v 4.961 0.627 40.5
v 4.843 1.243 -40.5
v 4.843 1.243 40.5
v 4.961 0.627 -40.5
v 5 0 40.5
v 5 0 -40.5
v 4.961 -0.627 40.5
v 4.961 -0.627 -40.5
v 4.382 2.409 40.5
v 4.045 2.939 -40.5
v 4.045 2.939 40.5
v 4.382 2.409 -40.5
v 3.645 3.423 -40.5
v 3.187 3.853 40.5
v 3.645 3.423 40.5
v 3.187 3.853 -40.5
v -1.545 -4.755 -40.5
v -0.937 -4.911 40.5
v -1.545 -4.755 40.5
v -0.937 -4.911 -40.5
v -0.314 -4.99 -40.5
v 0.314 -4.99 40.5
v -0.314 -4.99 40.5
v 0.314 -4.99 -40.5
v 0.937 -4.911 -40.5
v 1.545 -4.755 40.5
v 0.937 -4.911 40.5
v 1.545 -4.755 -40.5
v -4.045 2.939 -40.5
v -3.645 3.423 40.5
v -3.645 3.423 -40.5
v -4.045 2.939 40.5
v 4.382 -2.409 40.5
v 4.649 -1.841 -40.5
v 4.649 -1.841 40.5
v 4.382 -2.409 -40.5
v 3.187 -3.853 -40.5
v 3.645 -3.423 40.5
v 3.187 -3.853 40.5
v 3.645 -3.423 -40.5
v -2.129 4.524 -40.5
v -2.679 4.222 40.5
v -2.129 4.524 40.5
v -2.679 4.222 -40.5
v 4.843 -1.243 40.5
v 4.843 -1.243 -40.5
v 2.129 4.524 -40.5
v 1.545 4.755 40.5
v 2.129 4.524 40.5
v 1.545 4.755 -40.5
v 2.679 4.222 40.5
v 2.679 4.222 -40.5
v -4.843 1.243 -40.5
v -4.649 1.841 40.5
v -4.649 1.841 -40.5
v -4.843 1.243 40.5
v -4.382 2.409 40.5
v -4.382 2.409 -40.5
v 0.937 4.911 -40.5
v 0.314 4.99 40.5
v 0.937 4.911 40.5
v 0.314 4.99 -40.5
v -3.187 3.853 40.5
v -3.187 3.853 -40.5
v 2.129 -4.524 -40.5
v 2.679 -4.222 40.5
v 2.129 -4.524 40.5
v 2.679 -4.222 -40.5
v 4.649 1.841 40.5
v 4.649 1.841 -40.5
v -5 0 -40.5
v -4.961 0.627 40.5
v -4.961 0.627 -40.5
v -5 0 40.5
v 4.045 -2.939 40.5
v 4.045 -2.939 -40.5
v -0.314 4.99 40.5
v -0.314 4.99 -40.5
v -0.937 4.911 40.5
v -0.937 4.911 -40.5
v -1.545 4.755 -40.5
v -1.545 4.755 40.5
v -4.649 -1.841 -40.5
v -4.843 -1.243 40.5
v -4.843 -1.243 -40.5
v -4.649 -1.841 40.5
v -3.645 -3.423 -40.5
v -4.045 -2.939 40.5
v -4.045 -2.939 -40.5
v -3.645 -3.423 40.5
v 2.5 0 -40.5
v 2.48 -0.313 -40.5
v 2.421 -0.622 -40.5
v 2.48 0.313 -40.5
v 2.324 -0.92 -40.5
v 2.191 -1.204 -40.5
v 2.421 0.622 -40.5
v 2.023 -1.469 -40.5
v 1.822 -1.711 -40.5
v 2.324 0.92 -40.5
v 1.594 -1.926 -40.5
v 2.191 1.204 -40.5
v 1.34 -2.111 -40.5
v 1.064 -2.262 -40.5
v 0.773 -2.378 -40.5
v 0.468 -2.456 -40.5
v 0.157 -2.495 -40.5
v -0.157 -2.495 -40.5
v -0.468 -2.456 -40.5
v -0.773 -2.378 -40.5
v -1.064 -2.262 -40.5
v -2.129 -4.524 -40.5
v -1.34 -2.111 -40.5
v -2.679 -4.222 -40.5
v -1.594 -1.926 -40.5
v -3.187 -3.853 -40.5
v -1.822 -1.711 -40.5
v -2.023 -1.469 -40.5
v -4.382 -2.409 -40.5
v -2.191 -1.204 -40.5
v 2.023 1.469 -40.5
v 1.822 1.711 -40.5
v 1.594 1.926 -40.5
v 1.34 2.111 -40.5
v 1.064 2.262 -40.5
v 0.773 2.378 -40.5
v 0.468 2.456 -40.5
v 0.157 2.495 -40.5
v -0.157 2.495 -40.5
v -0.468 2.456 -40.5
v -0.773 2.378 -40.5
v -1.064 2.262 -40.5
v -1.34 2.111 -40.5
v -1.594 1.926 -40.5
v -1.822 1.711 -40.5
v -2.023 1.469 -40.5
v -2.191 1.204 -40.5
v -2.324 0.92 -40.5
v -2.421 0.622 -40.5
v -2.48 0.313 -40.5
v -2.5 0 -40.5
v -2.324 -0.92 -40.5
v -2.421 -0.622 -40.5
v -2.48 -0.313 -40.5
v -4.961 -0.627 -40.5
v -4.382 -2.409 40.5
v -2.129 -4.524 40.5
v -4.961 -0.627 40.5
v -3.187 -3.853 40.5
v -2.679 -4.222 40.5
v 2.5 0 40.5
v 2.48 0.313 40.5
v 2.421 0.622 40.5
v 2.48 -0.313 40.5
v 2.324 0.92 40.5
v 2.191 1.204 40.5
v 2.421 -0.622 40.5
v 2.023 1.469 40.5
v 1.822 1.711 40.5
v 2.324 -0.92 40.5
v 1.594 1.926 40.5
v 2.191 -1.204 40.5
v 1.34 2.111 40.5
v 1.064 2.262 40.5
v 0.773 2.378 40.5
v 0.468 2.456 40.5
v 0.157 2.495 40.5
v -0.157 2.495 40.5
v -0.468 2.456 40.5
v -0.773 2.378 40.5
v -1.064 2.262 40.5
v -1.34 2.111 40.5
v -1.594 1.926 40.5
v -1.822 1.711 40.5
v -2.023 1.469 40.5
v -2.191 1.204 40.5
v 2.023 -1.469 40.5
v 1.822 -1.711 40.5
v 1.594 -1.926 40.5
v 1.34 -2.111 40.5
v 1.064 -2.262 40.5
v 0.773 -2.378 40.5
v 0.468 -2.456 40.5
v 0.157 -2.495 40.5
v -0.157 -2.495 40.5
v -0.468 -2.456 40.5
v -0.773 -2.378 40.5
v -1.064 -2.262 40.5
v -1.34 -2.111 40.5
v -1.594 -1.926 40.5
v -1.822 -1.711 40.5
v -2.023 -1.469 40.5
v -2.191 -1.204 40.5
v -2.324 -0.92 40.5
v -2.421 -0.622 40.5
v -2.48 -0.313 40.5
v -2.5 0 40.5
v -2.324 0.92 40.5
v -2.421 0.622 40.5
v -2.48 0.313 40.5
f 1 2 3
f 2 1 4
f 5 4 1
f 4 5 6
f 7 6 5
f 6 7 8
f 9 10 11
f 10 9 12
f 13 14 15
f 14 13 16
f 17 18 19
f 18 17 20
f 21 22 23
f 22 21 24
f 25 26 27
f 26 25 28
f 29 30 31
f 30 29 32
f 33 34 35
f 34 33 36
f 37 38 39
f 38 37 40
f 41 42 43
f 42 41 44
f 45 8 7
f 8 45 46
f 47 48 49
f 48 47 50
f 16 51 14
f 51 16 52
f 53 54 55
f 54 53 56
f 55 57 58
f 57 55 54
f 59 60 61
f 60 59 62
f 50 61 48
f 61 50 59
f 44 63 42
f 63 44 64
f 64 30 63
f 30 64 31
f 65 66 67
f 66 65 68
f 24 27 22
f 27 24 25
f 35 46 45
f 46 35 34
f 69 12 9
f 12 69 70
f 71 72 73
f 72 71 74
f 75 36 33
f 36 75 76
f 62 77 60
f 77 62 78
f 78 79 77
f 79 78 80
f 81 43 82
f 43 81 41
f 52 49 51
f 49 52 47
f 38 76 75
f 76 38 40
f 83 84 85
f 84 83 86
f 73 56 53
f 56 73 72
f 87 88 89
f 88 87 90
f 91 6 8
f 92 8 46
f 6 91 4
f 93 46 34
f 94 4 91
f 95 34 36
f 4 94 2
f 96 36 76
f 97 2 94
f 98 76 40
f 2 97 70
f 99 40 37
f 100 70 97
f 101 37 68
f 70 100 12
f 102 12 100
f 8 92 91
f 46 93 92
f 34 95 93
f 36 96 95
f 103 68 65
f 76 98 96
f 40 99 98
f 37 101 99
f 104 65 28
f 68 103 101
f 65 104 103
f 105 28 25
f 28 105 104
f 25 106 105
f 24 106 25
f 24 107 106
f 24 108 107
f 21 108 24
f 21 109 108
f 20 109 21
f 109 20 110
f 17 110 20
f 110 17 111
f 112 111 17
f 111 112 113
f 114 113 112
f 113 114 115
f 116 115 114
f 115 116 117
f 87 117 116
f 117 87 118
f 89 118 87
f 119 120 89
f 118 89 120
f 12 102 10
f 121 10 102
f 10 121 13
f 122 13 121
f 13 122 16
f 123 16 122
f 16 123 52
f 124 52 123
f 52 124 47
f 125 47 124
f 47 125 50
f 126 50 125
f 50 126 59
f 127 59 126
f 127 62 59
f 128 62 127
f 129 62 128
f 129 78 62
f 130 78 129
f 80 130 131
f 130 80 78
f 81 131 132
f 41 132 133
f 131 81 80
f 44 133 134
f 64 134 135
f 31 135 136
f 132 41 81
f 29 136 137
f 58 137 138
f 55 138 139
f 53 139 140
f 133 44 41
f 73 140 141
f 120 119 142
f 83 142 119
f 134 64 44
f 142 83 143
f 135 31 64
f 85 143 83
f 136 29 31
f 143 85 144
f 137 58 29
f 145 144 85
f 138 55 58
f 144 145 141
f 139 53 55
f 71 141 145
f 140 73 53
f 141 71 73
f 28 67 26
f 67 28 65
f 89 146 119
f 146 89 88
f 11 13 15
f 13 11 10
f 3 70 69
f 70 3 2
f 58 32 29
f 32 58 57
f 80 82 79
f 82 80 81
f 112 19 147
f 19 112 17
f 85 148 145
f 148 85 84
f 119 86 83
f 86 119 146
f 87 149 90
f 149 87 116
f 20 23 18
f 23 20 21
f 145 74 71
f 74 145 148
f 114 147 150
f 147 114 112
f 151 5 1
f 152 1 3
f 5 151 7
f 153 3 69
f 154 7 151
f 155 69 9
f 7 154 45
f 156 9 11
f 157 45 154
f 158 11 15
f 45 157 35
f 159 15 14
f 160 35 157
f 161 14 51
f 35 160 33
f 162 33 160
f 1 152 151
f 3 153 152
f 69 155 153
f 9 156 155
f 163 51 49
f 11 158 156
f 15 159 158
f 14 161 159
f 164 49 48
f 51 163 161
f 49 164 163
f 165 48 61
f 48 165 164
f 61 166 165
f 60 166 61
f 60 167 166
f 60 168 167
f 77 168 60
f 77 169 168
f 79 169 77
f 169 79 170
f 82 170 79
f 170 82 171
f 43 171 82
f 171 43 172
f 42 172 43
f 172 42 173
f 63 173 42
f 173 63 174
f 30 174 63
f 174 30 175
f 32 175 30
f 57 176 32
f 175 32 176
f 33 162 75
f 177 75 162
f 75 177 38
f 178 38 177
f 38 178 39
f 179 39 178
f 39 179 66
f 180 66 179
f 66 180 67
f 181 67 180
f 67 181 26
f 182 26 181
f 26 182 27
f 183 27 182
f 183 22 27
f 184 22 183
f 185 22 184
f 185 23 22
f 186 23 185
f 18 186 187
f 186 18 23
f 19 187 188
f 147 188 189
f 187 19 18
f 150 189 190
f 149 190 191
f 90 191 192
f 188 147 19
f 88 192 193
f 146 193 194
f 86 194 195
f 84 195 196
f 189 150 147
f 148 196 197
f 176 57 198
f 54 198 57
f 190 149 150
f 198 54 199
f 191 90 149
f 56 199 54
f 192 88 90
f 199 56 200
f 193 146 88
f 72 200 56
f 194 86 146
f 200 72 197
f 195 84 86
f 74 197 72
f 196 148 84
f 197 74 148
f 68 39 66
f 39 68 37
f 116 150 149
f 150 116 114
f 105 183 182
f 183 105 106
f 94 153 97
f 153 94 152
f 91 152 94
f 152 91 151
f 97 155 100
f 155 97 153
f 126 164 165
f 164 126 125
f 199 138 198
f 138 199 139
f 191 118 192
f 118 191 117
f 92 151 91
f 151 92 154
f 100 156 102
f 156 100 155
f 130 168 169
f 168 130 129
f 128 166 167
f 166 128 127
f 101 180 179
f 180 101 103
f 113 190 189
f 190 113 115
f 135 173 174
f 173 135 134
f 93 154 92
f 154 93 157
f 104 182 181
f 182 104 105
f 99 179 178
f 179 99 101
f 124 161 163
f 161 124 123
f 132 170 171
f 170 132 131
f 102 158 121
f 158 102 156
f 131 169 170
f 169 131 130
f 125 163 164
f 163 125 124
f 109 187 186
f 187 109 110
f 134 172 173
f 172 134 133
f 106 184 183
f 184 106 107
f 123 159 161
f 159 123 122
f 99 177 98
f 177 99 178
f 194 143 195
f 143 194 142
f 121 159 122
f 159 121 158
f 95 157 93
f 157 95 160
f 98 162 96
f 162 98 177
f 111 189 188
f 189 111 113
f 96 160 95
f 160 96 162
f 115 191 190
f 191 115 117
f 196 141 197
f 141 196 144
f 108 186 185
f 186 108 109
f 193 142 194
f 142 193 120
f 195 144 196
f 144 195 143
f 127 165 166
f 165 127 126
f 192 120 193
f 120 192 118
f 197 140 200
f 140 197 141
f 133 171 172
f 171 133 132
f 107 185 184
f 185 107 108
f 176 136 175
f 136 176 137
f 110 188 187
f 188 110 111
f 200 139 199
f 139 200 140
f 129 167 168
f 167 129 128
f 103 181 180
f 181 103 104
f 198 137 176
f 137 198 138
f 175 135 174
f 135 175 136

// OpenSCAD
$fn = 50;


difference() {
	union() {
		translate(v = [0, 0, -40.5000000000]) {
			cylinder(h = 81, r = 5.0000000000);
		}
	}
	union() {
		translate(v = [0, 0, -100.0000000000]) {
			cylinder(h = 200, r = 2.5000000000);
		}
	}
}
